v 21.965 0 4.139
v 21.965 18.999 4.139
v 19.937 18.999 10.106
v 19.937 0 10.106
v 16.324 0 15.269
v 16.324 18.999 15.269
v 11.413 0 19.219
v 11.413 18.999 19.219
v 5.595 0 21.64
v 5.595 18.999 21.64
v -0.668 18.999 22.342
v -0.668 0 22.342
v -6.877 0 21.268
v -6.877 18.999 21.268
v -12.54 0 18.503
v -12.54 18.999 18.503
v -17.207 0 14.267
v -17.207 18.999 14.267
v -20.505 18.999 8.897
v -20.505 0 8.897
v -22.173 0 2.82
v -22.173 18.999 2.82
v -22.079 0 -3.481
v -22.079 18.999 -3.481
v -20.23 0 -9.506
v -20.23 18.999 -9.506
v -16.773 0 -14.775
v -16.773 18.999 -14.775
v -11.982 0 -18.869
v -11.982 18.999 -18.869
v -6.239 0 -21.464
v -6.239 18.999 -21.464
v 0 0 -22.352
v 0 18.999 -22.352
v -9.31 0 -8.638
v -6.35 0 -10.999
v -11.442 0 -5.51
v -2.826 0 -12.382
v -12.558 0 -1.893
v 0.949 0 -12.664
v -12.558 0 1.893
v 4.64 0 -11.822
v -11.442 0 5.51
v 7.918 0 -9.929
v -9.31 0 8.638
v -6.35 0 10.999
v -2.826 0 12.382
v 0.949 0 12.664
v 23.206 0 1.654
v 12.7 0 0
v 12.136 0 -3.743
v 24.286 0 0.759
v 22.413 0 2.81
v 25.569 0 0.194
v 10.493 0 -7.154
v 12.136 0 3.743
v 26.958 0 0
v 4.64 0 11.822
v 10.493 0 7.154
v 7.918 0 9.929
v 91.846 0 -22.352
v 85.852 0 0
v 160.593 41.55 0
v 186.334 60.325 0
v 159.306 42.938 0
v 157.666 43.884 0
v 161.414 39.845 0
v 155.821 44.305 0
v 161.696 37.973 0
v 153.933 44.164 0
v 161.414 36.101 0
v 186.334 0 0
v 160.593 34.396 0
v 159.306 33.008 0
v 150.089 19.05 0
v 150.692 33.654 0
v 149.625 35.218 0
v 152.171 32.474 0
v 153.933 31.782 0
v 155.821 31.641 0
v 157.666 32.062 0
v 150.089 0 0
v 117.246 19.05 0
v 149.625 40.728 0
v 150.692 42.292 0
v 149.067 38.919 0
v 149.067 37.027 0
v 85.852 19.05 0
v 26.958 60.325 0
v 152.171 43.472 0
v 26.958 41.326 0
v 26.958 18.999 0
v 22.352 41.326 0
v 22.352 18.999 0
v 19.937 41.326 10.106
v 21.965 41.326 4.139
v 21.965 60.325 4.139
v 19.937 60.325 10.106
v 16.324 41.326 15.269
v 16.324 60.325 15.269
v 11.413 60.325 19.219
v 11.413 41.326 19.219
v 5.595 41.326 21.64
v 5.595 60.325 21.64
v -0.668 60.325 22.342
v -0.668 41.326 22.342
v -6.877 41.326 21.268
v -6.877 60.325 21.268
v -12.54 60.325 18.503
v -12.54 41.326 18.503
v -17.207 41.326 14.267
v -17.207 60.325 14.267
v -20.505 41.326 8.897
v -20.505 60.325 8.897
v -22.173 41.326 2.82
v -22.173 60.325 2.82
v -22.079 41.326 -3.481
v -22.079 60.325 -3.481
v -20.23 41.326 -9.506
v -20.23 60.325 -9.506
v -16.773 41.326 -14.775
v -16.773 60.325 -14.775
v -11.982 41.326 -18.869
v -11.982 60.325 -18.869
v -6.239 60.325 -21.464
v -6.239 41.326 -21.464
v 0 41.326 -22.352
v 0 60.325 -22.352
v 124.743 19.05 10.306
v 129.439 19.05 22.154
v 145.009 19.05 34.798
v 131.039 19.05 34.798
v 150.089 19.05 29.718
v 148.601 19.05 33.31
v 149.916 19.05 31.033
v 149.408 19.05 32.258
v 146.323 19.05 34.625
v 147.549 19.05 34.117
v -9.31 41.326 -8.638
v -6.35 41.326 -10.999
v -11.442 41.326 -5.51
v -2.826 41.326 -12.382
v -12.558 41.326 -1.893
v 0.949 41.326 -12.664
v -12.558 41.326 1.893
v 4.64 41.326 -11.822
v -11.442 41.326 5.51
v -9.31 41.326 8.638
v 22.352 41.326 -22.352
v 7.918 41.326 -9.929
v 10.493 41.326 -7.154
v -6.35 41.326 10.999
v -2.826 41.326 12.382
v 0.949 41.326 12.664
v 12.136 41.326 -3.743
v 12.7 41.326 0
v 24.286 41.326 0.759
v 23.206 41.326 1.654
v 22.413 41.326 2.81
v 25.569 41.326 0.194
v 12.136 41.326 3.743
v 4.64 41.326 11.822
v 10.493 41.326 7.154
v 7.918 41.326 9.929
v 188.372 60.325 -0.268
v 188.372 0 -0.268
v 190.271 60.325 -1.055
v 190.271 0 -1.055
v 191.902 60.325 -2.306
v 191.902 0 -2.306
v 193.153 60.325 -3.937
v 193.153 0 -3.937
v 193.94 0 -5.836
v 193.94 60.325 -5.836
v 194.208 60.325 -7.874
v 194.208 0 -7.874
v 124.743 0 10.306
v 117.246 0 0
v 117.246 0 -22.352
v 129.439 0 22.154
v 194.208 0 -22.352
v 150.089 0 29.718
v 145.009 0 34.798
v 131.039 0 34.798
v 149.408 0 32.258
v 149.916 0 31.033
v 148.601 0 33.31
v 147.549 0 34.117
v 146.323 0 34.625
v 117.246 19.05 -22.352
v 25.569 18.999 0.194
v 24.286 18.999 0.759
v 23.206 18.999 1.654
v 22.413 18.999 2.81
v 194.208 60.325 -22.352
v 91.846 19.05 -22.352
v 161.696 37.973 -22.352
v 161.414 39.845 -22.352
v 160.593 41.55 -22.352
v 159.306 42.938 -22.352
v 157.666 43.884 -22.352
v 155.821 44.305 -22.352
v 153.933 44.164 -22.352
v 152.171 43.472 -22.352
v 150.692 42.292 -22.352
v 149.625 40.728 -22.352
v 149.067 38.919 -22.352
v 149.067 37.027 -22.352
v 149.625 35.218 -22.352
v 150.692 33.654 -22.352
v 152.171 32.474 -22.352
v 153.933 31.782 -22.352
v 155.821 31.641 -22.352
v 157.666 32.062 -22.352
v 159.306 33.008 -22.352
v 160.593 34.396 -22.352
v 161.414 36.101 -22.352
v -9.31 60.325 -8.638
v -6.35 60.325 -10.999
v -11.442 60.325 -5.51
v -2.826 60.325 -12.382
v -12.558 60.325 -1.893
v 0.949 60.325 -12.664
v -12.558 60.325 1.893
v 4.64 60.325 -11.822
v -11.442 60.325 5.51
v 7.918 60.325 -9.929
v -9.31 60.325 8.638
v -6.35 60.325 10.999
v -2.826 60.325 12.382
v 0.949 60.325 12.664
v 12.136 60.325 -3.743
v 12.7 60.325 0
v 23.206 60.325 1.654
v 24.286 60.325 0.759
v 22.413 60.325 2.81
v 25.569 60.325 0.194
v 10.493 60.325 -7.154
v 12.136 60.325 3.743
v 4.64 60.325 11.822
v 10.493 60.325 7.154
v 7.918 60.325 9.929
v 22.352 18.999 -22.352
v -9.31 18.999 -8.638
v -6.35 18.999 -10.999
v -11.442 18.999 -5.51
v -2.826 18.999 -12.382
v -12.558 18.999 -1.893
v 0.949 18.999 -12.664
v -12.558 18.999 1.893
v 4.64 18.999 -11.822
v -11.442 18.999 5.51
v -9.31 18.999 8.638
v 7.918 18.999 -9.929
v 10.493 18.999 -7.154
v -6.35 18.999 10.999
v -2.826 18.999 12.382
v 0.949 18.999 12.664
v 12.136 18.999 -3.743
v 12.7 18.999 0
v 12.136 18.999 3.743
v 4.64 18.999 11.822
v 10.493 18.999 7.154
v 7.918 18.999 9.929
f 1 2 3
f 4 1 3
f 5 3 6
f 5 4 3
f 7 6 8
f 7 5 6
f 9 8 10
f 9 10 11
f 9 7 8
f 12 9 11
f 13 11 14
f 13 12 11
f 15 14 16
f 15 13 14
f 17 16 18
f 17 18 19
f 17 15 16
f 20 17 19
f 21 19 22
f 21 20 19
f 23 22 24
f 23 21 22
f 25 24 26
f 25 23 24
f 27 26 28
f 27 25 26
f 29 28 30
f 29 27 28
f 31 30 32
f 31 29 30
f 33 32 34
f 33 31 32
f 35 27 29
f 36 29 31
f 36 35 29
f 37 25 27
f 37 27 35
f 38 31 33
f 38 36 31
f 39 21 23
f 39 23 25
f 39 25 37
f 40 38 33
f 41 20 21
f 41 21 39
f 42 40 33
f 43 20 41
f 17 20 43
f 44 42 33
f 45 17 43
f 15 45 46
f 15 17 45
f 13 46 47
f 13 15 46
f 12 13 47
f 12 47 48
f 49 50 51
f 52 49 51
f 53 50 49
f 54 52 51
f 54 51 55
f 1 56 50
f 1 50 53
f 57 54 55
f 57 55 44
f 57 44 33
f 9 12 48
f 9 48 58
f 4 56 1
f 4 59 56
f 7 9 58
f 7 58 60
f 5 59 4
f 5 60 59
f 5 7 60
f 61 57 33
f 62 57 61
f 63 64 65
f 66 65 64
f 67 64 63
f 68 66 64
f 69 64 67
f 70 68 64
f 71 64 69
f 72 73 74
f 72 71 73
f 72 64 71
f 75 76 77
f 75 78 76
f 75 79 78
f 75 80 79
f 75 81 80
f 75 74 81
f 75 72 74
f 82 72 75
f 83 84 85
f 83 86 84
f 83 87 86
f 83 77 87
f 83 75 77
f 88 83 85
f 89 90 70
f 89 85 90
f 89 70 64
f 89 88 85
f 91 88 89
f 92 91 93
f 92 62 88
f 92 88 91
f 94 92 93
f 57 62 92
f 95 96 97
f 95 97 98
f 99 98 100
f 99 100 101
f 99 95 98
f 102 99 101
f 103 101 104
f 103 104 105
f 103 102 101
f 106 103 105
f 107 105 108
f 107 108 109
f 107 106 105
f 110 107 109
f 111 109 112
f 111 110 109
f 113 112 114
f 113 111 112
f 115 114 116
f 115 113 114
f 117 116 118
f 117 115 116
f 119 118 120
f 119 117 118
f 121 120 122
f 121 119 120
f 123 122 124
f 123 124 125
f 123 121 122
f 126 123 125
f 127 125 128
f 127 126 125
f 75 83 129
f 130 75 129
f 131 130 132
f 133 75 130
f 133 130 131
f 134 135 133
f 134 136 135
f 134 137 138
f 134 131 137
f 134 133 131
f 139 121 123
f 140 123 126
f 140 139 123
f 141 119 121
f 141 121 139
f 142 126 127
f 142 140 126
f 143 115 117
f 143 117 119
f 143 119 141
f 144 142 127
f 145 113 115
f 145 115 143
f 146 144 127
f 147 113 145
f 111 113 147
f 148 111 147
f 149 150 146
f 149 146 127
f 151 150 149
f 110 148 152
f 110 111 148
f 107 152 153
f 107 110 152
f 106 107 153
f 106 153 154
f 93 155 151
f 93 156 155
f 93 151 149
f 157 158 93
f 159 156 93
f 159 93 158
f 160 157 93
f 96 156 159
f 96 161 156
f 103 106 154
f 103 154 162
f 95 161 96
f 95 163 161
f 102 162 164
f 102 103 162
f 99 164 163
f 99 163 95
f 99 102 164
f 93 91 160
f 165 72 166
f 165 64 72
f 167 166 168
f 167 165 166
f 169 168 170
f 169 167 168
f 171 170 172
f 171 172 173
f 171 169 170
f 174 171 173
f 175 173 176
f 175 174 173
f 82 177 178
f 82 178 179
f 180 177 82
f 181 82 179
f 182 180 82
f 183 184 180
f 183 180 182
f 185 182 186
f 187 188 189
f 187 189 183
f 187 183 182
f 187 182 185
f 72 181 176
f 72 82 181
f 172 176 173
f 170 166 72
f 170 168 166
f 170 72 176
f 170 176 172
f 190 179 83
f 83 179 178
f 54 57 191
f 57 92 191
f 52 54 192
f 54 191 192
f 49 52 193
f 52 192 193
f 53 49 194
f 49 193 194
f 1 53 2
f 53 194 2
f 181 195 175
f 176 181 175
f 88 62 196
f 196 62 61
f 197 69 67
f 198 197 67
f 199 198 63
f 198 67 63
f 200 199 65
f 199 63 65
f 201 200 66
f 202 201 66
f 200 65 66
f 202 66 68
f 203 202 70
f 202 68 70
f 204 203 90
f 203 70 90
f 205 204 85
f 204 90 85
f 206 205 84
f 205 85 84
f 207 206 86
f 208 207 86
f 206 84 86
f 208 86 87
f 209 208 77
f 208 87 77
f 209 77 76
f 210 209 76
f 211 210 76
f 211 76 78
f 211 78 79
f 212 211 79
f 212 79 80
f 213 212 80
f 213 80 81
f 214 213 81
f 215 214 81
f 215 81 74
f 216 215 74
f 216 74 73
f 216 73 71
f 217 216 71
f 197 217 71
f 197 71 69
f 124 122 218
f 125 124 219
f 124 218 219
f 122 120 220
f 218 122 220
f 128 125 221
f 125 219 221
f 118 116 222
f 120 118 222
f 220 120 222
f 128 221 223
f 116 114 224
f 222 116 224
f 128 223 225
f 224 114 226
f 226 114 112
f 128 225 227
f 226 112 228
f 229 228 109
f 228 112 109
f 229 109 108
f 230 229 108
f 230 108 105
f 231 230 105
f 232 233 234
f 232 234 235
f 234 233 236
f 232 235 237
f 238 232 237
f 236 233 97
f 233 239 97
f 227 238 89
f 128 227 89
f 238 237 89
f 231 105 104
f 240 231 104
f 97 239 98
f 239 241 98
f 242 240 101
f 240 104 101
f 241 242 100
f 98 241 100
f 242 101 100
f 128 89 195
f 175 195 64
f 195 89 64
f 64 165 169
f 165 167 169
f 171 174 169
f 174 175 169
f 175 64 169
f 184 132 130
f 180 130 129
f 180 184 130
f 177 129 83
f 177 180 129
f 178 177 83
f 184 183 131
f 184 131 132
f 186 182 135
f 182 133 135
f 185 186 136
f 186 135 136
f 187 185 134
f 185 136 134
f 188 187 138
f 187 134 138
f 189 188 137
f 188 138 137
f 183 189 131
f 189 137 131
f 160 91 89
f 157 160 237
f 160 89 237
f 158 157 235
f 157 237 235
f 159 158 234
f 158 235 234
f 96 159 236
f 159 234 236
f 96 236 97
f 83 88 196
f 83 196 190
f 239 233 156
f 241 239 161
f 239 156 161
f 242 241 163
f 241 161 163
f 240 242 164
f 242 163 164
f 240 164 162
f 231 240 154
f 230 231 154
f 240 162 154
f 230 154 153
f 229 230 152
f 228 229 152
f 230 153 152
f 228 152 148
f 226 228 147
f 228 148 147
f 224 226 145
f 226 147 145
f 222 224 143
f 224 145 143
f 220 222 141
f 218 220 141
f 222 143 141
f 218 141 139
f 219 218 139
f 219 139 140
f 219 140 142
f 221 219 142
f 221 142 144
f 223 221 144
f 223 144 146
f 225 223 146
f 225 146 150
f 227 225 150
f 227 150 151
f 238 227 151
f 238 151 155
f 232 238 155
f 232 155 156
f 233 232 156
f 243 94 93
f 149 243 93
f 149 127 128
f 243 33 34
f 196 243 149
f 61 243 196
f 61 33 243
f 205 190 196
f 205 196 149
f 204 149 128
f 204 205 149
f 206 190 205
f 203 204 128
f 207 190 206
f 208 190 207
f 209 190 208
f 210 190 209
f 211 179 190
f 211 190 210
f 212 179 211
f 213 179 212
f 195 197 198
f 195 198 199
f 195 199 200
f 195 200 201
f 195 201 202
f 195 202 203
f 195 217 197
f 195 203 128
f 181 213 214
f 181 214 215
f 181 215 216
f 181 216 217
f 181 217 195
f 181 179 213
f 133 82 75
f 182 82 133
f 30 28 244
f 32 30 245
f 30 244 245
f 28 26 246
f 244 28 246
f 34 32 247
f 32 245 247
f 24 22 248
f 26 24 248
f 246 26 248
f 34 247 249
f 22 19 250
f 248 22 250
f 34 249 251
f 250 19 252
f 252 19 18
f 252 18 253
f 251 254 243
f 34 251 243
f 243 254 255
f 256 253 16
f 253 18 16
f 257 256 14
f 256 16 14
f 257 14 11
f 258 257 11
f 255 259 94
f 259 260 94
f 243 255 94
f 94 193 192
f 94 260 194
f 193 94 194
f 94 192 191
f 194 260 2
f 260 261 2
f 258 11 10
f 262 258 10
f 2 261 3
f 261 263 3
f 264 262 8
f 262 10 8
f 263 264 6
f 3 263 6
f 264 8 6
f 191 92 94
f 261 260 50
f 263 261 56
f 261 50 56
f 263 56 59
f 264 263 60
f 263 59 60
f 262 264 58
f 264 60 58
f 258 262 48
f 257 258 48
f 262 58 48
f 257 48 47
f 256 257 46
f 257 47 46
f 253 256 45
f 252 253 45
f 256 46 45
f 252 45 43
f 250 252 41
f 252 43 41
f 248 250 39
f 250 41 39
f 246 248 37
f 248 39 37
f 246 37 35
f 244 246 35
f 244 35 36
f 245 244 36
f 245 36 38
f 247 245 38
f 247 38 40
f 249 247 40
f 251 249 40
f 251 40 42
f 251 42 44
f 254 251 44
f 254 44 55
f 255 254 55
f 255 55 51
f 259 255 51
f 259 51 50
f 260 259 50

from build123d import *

# Parameters (mm, degrees)
F0_R     = 12.7
F1_DEPTH = 60.325
F2_DEPTH = 19.05
F3_W     = 41.275
F3_H     = 34.798
F4_DEPTH = 50.8
F5_W     = 55.2958
F5_H     = 22.3266
F6_DEPTH = 63.5
F7_R     = 6.35
F8_DEPTH = 127
F9_R     = 7.874
F10_R    = 5.08
F11_R    = 5.08


with BuildPart() as f1:
    # F0 (on Front) → F1 (new body)
    with BuildSketch(Plane.XZ):
        with BuildLine():
            Line((85.852, 0), (22.352, 0))
            ThreePointArc((22.352, 0), (-15.8052507731, 15.8052507731), (0, -22.352))
            Line((0, -22.352), (91.8464, -22.352))
            Line((91.8464, -22.352), (85.852, 0))
        make_face()
        Circle(F0_R, mode=Mode.SUBTRACT)
        Polygon((117.2464, 0), (85.852, 0), (91.8464, -22.352), (117.2464, -22.352), align=None)
        with BuildLine():
            ThreePointArc((131.0386, 34.798), (127.4644153616, 16.0823576341), (117.2464, 0))
            Line((117.2464, 0), (117.2464, -22.352))
            Line((117.2464, -22.352), (194.2084, -22.352))
            Line((194.2084, -22.352), (194.2084, 0))
            Line((194.2084, 0), (150.0886, 0))
            Line((150.0886, 0), (150.0886, 34.798))
            Line((150.0886, 34.798), (131.0386, 34.798))
        make_face()
    extrude(amount=-F1_DEPTH)

    # F0 (on Front) → F2 (cut)
    with BuildSketch(Plane.XZ):
        Polygon((117.2464, 0), (85.852, 0), (91.8464, -22.352), (117.2464, -22.352), align=None)
    extrude(amount=-F2_DEPTH, mode=Mode.SUBTRACT)

    # F3 (on face) → F4 (cut)
    with BuildSketch(Plane.YZ.offset(150.0886)):
        with Locations((39.6875, 17.399)):
            Rectangle(F3_W, F3_H)
    extrude(amount=-F4_DEPTH, mode=Mode.SUBTRACT)

    # F5 (on Top) → F6 (cut, symmetric)
    with BuildSketch(Plane.XY):
        with Locations((-5.2959, 30.1625)):
            Rectangle(F5_W, F5_H)
    extrude(amount=F6_DEPTH, both=True, mode=Mode.SUBTRACT)

    # F7 (on face) → F8 (cut)
    with BuildSketch(Plane.XY):
        with Locations((155.3464, 37.973)):
            Circle(F7_R)
    extrude(amount=-F8_DEPTH, mode=Mode.SUBTRACT)

    # F9
    f9_edges = [f1.edges().sort_by_distance(p)[0] for p in [
        (194.2084, 30.1625, 0),
    ]]
    fillet(f9_edges, radius=F9_R)

    # F10
    f10_edges = [f1.edges().sort_by_distance(p)[0] for p in [
        (150.0886, 9.525, 34.798),
    ]]
    fillet(f10_edges, radius=F10_R)

    # F11
    f11_edges = [f1.edges().sort_by_distance(p)[0] for p in [
        (22.352, 9.4996, 0),
        (22.352, 50.8254, 0),
    ]]
    fillet(f11_edges, radius=F11_R)


solid = f1.part
